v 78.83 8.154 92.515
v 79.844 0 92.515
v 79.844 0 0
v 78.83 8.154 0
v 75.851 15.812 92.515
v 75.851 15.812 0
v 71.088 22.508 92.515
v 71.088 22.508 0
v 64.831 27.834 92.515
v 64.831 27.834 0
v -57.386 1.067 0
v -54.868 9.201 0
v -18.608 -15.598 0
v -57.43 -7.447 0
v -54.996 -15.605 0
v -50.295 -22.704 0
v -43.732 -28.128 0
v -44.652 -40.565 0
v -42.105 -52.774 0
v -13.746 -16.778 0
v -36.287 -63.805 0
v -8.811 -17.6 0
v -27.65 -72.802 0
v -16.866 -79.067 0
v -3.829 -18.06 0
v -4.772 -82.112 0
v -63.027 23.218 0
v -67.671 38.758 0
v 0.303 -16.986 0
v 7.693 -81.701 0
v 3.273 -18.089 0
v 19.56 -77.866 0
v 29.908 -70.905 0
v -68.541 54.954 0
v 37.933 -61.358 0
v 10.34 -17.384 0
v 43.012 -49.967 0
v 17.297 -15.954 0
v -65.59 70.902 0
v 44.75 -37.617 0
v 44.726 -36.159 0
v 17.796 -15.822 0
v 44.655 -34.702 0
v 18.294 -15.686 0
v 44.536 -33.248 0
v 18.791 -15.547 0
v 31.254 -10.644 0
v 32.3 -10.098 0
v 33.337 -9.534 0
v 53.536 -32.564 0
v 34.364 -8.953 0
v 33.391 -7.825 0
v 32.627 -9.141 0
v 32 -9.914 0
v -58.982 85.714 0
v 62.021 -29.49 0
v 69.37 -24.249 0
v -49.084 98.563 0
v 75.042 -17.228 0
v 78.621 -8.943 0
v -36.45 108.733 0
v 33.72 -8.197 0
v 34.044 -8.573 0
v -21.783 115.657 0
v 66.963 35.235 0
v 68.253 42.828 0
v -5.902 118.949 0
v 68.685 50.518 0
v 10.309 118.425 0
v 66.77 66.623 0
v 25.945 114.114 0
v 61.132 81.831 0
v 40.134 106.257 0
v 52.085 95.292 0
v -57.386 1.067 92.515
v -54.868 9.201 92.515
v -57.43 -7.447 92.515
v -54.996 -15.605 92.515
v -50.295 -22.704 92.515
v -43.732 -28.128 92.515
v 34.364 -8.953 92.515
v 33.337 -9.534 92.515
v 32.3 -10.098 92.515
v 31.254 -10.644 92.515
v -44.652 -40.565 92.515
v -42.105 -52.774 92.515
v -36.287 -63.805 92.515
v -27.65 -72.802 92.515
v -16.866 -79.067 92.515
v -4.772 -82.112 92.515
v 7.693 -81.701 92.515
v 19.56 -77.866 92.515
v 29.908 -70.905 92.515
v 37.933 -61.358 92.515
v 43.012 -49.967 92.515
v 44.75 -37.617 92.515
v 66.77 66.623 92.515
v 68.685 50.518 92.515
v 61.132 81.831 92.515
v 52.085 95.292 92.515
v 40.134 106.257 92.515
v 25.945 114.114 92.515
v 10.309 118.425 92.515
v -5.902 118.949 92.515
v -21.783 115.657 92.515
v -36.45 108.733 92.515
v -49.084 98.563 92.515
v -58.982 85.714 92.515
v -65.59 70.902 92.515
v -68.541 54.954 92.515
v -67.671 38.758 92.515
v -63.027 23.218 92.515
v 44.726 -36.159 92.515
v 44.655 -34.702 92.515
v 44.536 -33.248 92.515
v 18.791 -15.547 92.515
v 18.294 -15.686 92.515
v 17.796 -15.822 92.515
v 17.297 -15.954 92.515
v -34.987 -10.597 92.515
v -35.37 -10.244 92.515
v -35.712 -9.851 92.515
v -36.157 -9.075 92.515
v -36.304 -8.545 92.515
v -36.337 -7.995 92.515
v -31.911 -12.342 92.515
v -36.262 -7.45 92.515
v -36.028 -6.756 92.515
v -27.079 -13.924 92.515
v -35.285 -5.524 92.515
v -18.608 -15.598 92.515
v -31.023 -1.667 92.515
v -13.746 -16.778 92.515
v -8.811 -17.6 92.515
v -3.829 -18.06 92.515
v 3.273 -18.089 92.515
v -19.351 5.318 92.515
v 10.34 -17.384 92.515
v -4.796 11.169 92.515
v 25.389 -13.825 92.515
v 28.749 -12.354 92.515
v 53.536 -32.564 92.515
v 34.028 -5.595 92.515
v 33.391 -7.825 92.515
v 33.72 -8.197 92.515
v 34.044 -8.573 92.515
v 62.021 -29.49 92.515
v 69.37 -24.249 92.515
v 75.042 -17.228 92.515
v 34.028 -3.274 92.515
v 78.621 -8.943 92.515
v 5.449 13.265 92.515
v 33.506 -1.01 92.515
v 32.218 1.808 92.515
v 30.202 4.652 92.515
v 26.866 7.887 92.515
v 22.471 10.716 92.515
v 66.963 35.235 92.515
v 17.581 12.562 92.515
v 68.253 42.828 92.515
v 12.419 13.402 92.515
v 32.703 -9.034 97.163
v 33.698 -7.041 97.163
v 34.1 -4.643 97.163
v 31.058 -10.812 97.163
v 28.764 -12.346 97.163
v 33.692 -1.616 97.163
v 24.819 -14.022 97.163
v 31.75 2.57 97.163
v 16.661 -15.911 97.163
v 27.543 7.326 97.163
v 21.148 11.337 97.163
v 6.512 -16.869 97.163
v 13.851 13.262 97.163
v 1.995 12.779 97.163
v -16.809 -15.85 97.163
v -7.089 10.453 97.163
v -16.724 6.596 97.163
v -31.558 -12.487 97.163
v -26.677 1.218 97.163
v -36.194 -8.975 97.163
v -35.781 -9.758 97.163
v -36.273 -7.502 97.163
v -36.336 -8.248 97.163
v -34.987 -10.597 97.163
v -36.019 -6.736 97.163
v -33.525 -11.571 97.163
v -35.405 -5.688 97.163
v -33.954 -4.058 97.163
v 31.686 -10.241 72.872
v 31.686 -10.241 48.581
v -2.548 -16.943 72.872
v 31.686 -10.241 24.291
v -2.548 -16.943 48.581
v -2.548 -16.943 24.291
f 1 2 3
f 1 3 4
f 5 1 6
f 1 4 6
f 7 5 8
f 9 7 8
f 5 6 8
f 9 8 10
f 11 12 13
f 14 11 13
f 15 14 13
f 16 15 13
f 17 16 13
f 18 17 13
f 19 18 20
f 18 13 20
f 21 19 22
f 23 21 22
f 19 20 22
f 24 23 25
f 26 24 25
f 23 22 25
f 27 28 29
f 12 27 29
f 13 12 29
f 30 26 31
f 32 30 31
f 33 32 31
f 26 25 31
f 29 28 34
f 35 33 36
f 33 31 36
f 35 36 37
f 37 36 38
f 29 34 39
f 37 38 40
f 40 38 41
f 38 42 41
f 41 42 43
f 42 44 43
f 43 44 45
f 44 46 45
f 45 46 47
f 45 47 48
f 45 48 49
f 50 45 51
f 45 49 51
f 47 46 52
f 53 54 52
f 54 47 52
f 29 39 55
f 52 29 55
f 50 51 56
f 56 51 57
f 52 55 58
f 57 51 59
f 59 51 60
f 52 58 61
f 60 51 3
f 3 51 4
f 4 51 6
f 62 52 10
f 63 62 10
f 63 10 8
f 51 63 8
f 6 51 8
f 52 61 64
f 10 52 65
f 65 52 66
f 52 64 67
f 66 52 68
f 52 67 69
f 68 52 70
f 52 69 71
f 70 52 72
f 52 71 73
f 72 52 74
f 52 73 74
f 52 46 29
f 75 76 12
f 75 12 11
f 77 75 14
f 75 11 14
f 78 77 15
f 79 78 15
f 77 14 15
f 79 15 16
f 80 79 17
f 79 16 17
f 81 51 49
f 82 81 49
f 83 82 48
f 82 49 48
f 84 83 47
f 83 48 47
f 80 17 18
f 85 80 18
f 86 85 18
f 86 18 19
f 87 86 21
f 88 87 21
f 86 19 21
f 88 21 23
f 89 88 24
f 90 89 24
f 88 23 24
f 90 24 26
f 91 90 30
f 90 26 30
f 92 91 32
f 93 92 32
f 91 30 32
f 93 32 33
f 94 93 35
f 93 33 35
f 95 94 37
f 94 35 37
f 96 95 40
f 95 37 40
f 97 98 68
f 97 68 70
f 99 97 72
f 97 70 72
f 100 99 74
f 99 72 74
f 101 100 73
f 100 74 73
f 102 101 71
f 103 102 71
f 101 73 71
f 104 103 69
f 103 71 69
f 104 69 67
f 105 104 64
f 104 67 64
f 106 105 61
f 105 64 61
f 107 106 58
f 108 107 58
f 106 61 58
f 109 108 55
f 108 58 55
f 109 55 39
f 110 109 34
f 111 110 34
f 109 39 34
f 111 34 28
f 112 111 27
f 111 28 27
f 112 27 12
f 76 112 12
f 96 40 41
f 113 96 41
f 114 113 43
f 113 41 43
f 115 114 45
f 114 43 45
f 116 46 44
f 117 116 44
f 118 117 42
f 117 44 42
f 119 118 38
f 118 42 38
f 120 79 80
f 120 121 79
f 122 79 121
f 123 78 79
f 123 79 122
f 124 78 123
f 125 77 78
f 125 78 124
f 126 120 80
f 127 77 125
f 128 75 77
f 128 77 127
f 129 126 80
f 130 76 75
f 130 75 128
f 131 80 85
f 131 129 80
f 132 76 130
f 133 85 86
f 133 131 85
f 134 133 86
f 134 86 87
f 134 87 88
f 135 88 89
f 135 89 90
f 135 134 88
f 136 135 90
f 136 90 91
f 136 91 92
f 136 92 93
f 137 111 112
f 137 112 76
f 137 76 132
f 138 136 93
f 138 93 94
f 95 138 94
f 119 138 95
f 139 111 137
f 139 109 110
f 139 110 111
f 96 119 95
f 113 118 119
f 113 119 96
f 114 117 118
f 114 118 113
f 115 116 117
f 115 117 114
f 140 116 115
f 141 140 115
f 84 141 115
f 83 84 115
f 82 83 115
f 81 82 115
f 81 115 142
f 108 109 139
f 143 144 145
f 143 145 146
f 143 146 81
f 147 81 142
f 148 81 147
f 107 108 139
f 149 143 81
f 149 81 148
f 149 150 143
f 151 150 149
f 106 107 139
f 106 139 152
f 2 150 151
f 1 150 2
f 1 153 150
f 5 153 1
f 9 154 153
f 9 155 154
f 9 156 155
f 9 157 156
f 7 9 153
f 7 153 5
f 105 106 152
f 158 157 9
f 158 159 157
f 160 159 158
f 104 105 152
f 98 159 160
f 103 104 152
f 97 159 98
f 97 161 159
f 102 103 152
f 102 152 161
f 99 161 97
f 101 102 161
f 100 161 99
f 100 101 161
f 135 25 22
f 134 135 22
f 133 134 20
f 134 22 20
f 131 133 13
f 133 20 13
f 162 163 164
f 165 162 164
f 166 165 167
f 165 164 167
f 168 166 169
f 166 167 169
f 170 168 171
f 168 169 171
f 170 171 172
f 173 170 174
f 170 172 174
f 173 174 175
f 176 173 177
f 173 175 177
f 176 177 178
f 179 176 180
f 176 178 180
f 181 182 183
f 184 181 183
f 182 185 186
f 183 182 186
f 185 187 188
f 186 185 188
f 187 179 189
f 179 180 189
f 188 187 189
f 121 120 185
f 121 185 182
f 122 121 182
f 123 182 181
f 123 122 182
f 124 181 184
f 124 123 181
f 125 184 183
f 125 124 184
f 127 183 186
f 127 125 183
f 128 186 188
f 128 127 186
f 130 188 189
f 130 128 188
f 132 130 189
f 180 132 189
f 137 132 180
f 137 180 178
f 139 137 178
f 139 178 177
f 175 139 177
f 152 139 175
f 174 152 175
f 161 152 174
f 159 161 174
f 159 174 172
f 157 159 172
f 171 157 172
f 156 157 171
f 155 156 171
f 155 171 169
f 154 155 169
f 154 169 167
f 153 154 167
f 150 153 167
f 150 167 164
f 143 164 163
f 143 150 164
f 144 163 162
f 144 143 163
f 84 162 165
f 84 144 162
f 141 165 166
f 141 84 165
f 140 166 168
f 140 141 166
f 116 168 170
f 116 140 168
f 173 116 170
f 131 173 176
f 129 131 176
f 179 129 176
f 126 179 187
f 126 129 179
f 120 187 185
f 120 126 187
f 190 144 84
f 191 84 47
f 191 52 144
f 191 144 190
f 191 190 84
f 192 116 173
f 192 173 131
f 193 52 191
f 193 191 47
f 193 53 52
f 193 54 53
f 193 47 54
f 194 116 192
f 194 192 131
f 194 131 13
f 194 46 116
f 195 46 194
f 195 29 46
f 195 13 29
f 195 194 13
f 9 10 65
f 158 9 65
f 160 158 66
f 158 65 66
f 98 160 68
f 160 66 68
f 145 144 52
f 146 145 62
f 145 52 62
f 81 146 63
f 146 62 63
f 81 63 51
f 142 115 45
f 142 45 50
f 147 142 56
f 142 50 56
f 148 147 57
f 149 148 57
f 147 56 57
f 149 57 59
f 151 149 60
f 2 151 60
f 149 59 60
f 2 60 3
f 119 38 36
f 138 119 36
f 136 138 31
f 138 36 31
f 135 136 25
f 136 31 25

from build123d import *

# Parameters (mm, degrees)
F2_DEPTH = 92.5154741853
F0_DEPTH = 97.1629172564


with BuildPart() as f2:
    # F1 (on Top) → F2 (new body)
    with BuildSketch(Plane.XY):
        with BuildLine():
            ThreePointArc((44.535878433, -33.2482290868), (69.3702098075, -24.249252625), (79.8439550455, 0))
            ThreePointArc((79.8439550455, 0), (75.8514189323, 15.8123037264), (64.8309496766, 27.8338906072))
            ThreePointArc((64.8309496766, 27.8338906072), (52.8981608399, 6.706864812), (34.3638503598, -8.9527010632))
            ThreePointArc((34.3638503598, -8.9527010632), (41.2778387441, -20.3351305507), (44.535878433, -33.2482290868))
        make_face()
        with BuildLine():
            ThreePointArc((34.3638503598, -8.9527010632), (52.8981608399, 6.706864812), (64.8309496766, 27.8338906072))
            ThreePointArc((64.8309496766, 27.8338906072), (32.9810423523, 30.4255919297), (13.6068053003, 5.0135386682))
            ThreePointArc((13.6068053003, 5.0135386682), (24.9811912081, -0.4894991276), (34.3638503598, -8.9527010632))
        make_face()
        with BuildLine():
            ThreePointArc((13.6068053003, 5.0135386682), (32.9810423523, 30.4255919297), (64.8309496766, 27.8338906072))
            ThreePointArc((64.8309496766, 27.8338906072), (67.7145282445, 39.013298427), (68.6848598779, 50.5177602172))
            ThreePointArc((68.6848598779, 50.5177602172), (-21.7831497836, 115.6568756699), (-54.8679687803, 9.2005001631))
            ThreePointArc((-54.8679687803, 9.2005001631), (-27.6196679815, 25.597862276), (-1.7527016438, 7.0980397588))
            ThreePointArc((-1.7527016438, 7.0980397588), (6.0179921547, 6.7258769298), (13.6068053003, 5.0135386682))
        make_face()
        with BuildLine():
            ThreePointArc((44.7496727734, -37.6172959805), (44.6961922309, -35.4301486637), (44.535878433, -33.2482290868))
            ThreePointArc((44.535878433, -33.2482290868), (28.6822600259, -28.119398588), (17.2965115244, -15.9535919997))
            ThreePointArc((17.2965115244, -15.9535919997), (6.8156269651, -17.8281043653), (-3.8290350442, -18.0602863216))
            ThreePointArc((-3.8290350442, -18.0602863216), (-21.6809587163, -31.4155799712), (-43.73192107, -28.1277073248))
            ThreePointArc((-43.73192107, -28.1277073248), (-4.7720045941, -82.1118033435), (44.7496727734, -37.6172959805))
        make_face()
        with BuildLine():
            ThreePointArc((17.2965115244, -15.9535919997), (28.6822600259, -28.119398588), (44.535878433, -33.2482290868))
            ThreePointArc((44.535878433, -33.2482290868), (41.2778387441, -20.3351305507), (34.3638503598, -8.9527010632))
            ThreePointArc((34.3638503598, -8.9527010632), (26.0662879209, -13.0287472437), (17.2965115244, -15.9535919997))
        make_face()
        with BuildLine():
            ThreePointArc((-34.3638503598, -8.9527010632), (-19.7612727928, 2.5327390249), (-1.7527016438, 7.0980397588))
            ThreePointArc((-1.7527016438, 7.0980397588), (-27.6196679815, 25.597862276), (-54.8679687803, 9.2005001631))
            ThreePointArc((-54.8679687803, 9.2005001631), (-45.5298151265, -0.9083606845), (-34.3638503598, -8.9527010632))
        make_face()
        with BuildLine():
            ThreePointArc((-34.3638503598, -8.9527010632), (-45.5298151265, -0.9083606845), (-54.8679687803, 9.2005001631))
            ThreePointArc((-54.8679687803, 9.2005001631), (-56.5144673123, -11.6158972728), (-43.73192107, -28.1277073248))
            ThreePointArc((-43.73192107, -28.1277073248), (-40.2076807972, -17.9735789636), (-34.3638503598, -8.9527010632))
        make_face()
        with BuildLine():
            ThreePointArc((-43.73192107, -28.1277073248), (-21.6809587163, -31.4155799712), (-3.8290350442, -18.0602863216))
            ThreePointArc((-3.8290350442, -18.0602863216), (-19.6318911769, -15.3016808718), (-34.3638503598, -8.9527010632))
            ThreePointArc((-34.3638503598, -8.9527010632), (-40.2076807972, -17.9735789636), (-43.73192107, -28.1277073248))
        make_face()
    extrude(amount=F2_DEPTH)

    # F3 (on Top) → F0 (join)
    with BuildSketch(Plane.XY):
        with BuildLine():
            add(Edge.make_bspline(
                [(-34.9871255457, -10.5970427394), (-38.5202182083, -7.629362708), (-26.9744975771, 3.3374806038), (20.1910972985, 24.1151109584), (50.3086010226, -22.7421521605), (-26.7868217781, -17.4850244785), (-34.9871255457, -10.5970427394)],
                knots=[0, 0, 0, 0, 0.1481479543, 0.4463197978, 0.6561487784, 1, 1, 1, 1], degree=3))
        make_face()
    extrude(amount=F0_DEPTH)


solid = f2.part
